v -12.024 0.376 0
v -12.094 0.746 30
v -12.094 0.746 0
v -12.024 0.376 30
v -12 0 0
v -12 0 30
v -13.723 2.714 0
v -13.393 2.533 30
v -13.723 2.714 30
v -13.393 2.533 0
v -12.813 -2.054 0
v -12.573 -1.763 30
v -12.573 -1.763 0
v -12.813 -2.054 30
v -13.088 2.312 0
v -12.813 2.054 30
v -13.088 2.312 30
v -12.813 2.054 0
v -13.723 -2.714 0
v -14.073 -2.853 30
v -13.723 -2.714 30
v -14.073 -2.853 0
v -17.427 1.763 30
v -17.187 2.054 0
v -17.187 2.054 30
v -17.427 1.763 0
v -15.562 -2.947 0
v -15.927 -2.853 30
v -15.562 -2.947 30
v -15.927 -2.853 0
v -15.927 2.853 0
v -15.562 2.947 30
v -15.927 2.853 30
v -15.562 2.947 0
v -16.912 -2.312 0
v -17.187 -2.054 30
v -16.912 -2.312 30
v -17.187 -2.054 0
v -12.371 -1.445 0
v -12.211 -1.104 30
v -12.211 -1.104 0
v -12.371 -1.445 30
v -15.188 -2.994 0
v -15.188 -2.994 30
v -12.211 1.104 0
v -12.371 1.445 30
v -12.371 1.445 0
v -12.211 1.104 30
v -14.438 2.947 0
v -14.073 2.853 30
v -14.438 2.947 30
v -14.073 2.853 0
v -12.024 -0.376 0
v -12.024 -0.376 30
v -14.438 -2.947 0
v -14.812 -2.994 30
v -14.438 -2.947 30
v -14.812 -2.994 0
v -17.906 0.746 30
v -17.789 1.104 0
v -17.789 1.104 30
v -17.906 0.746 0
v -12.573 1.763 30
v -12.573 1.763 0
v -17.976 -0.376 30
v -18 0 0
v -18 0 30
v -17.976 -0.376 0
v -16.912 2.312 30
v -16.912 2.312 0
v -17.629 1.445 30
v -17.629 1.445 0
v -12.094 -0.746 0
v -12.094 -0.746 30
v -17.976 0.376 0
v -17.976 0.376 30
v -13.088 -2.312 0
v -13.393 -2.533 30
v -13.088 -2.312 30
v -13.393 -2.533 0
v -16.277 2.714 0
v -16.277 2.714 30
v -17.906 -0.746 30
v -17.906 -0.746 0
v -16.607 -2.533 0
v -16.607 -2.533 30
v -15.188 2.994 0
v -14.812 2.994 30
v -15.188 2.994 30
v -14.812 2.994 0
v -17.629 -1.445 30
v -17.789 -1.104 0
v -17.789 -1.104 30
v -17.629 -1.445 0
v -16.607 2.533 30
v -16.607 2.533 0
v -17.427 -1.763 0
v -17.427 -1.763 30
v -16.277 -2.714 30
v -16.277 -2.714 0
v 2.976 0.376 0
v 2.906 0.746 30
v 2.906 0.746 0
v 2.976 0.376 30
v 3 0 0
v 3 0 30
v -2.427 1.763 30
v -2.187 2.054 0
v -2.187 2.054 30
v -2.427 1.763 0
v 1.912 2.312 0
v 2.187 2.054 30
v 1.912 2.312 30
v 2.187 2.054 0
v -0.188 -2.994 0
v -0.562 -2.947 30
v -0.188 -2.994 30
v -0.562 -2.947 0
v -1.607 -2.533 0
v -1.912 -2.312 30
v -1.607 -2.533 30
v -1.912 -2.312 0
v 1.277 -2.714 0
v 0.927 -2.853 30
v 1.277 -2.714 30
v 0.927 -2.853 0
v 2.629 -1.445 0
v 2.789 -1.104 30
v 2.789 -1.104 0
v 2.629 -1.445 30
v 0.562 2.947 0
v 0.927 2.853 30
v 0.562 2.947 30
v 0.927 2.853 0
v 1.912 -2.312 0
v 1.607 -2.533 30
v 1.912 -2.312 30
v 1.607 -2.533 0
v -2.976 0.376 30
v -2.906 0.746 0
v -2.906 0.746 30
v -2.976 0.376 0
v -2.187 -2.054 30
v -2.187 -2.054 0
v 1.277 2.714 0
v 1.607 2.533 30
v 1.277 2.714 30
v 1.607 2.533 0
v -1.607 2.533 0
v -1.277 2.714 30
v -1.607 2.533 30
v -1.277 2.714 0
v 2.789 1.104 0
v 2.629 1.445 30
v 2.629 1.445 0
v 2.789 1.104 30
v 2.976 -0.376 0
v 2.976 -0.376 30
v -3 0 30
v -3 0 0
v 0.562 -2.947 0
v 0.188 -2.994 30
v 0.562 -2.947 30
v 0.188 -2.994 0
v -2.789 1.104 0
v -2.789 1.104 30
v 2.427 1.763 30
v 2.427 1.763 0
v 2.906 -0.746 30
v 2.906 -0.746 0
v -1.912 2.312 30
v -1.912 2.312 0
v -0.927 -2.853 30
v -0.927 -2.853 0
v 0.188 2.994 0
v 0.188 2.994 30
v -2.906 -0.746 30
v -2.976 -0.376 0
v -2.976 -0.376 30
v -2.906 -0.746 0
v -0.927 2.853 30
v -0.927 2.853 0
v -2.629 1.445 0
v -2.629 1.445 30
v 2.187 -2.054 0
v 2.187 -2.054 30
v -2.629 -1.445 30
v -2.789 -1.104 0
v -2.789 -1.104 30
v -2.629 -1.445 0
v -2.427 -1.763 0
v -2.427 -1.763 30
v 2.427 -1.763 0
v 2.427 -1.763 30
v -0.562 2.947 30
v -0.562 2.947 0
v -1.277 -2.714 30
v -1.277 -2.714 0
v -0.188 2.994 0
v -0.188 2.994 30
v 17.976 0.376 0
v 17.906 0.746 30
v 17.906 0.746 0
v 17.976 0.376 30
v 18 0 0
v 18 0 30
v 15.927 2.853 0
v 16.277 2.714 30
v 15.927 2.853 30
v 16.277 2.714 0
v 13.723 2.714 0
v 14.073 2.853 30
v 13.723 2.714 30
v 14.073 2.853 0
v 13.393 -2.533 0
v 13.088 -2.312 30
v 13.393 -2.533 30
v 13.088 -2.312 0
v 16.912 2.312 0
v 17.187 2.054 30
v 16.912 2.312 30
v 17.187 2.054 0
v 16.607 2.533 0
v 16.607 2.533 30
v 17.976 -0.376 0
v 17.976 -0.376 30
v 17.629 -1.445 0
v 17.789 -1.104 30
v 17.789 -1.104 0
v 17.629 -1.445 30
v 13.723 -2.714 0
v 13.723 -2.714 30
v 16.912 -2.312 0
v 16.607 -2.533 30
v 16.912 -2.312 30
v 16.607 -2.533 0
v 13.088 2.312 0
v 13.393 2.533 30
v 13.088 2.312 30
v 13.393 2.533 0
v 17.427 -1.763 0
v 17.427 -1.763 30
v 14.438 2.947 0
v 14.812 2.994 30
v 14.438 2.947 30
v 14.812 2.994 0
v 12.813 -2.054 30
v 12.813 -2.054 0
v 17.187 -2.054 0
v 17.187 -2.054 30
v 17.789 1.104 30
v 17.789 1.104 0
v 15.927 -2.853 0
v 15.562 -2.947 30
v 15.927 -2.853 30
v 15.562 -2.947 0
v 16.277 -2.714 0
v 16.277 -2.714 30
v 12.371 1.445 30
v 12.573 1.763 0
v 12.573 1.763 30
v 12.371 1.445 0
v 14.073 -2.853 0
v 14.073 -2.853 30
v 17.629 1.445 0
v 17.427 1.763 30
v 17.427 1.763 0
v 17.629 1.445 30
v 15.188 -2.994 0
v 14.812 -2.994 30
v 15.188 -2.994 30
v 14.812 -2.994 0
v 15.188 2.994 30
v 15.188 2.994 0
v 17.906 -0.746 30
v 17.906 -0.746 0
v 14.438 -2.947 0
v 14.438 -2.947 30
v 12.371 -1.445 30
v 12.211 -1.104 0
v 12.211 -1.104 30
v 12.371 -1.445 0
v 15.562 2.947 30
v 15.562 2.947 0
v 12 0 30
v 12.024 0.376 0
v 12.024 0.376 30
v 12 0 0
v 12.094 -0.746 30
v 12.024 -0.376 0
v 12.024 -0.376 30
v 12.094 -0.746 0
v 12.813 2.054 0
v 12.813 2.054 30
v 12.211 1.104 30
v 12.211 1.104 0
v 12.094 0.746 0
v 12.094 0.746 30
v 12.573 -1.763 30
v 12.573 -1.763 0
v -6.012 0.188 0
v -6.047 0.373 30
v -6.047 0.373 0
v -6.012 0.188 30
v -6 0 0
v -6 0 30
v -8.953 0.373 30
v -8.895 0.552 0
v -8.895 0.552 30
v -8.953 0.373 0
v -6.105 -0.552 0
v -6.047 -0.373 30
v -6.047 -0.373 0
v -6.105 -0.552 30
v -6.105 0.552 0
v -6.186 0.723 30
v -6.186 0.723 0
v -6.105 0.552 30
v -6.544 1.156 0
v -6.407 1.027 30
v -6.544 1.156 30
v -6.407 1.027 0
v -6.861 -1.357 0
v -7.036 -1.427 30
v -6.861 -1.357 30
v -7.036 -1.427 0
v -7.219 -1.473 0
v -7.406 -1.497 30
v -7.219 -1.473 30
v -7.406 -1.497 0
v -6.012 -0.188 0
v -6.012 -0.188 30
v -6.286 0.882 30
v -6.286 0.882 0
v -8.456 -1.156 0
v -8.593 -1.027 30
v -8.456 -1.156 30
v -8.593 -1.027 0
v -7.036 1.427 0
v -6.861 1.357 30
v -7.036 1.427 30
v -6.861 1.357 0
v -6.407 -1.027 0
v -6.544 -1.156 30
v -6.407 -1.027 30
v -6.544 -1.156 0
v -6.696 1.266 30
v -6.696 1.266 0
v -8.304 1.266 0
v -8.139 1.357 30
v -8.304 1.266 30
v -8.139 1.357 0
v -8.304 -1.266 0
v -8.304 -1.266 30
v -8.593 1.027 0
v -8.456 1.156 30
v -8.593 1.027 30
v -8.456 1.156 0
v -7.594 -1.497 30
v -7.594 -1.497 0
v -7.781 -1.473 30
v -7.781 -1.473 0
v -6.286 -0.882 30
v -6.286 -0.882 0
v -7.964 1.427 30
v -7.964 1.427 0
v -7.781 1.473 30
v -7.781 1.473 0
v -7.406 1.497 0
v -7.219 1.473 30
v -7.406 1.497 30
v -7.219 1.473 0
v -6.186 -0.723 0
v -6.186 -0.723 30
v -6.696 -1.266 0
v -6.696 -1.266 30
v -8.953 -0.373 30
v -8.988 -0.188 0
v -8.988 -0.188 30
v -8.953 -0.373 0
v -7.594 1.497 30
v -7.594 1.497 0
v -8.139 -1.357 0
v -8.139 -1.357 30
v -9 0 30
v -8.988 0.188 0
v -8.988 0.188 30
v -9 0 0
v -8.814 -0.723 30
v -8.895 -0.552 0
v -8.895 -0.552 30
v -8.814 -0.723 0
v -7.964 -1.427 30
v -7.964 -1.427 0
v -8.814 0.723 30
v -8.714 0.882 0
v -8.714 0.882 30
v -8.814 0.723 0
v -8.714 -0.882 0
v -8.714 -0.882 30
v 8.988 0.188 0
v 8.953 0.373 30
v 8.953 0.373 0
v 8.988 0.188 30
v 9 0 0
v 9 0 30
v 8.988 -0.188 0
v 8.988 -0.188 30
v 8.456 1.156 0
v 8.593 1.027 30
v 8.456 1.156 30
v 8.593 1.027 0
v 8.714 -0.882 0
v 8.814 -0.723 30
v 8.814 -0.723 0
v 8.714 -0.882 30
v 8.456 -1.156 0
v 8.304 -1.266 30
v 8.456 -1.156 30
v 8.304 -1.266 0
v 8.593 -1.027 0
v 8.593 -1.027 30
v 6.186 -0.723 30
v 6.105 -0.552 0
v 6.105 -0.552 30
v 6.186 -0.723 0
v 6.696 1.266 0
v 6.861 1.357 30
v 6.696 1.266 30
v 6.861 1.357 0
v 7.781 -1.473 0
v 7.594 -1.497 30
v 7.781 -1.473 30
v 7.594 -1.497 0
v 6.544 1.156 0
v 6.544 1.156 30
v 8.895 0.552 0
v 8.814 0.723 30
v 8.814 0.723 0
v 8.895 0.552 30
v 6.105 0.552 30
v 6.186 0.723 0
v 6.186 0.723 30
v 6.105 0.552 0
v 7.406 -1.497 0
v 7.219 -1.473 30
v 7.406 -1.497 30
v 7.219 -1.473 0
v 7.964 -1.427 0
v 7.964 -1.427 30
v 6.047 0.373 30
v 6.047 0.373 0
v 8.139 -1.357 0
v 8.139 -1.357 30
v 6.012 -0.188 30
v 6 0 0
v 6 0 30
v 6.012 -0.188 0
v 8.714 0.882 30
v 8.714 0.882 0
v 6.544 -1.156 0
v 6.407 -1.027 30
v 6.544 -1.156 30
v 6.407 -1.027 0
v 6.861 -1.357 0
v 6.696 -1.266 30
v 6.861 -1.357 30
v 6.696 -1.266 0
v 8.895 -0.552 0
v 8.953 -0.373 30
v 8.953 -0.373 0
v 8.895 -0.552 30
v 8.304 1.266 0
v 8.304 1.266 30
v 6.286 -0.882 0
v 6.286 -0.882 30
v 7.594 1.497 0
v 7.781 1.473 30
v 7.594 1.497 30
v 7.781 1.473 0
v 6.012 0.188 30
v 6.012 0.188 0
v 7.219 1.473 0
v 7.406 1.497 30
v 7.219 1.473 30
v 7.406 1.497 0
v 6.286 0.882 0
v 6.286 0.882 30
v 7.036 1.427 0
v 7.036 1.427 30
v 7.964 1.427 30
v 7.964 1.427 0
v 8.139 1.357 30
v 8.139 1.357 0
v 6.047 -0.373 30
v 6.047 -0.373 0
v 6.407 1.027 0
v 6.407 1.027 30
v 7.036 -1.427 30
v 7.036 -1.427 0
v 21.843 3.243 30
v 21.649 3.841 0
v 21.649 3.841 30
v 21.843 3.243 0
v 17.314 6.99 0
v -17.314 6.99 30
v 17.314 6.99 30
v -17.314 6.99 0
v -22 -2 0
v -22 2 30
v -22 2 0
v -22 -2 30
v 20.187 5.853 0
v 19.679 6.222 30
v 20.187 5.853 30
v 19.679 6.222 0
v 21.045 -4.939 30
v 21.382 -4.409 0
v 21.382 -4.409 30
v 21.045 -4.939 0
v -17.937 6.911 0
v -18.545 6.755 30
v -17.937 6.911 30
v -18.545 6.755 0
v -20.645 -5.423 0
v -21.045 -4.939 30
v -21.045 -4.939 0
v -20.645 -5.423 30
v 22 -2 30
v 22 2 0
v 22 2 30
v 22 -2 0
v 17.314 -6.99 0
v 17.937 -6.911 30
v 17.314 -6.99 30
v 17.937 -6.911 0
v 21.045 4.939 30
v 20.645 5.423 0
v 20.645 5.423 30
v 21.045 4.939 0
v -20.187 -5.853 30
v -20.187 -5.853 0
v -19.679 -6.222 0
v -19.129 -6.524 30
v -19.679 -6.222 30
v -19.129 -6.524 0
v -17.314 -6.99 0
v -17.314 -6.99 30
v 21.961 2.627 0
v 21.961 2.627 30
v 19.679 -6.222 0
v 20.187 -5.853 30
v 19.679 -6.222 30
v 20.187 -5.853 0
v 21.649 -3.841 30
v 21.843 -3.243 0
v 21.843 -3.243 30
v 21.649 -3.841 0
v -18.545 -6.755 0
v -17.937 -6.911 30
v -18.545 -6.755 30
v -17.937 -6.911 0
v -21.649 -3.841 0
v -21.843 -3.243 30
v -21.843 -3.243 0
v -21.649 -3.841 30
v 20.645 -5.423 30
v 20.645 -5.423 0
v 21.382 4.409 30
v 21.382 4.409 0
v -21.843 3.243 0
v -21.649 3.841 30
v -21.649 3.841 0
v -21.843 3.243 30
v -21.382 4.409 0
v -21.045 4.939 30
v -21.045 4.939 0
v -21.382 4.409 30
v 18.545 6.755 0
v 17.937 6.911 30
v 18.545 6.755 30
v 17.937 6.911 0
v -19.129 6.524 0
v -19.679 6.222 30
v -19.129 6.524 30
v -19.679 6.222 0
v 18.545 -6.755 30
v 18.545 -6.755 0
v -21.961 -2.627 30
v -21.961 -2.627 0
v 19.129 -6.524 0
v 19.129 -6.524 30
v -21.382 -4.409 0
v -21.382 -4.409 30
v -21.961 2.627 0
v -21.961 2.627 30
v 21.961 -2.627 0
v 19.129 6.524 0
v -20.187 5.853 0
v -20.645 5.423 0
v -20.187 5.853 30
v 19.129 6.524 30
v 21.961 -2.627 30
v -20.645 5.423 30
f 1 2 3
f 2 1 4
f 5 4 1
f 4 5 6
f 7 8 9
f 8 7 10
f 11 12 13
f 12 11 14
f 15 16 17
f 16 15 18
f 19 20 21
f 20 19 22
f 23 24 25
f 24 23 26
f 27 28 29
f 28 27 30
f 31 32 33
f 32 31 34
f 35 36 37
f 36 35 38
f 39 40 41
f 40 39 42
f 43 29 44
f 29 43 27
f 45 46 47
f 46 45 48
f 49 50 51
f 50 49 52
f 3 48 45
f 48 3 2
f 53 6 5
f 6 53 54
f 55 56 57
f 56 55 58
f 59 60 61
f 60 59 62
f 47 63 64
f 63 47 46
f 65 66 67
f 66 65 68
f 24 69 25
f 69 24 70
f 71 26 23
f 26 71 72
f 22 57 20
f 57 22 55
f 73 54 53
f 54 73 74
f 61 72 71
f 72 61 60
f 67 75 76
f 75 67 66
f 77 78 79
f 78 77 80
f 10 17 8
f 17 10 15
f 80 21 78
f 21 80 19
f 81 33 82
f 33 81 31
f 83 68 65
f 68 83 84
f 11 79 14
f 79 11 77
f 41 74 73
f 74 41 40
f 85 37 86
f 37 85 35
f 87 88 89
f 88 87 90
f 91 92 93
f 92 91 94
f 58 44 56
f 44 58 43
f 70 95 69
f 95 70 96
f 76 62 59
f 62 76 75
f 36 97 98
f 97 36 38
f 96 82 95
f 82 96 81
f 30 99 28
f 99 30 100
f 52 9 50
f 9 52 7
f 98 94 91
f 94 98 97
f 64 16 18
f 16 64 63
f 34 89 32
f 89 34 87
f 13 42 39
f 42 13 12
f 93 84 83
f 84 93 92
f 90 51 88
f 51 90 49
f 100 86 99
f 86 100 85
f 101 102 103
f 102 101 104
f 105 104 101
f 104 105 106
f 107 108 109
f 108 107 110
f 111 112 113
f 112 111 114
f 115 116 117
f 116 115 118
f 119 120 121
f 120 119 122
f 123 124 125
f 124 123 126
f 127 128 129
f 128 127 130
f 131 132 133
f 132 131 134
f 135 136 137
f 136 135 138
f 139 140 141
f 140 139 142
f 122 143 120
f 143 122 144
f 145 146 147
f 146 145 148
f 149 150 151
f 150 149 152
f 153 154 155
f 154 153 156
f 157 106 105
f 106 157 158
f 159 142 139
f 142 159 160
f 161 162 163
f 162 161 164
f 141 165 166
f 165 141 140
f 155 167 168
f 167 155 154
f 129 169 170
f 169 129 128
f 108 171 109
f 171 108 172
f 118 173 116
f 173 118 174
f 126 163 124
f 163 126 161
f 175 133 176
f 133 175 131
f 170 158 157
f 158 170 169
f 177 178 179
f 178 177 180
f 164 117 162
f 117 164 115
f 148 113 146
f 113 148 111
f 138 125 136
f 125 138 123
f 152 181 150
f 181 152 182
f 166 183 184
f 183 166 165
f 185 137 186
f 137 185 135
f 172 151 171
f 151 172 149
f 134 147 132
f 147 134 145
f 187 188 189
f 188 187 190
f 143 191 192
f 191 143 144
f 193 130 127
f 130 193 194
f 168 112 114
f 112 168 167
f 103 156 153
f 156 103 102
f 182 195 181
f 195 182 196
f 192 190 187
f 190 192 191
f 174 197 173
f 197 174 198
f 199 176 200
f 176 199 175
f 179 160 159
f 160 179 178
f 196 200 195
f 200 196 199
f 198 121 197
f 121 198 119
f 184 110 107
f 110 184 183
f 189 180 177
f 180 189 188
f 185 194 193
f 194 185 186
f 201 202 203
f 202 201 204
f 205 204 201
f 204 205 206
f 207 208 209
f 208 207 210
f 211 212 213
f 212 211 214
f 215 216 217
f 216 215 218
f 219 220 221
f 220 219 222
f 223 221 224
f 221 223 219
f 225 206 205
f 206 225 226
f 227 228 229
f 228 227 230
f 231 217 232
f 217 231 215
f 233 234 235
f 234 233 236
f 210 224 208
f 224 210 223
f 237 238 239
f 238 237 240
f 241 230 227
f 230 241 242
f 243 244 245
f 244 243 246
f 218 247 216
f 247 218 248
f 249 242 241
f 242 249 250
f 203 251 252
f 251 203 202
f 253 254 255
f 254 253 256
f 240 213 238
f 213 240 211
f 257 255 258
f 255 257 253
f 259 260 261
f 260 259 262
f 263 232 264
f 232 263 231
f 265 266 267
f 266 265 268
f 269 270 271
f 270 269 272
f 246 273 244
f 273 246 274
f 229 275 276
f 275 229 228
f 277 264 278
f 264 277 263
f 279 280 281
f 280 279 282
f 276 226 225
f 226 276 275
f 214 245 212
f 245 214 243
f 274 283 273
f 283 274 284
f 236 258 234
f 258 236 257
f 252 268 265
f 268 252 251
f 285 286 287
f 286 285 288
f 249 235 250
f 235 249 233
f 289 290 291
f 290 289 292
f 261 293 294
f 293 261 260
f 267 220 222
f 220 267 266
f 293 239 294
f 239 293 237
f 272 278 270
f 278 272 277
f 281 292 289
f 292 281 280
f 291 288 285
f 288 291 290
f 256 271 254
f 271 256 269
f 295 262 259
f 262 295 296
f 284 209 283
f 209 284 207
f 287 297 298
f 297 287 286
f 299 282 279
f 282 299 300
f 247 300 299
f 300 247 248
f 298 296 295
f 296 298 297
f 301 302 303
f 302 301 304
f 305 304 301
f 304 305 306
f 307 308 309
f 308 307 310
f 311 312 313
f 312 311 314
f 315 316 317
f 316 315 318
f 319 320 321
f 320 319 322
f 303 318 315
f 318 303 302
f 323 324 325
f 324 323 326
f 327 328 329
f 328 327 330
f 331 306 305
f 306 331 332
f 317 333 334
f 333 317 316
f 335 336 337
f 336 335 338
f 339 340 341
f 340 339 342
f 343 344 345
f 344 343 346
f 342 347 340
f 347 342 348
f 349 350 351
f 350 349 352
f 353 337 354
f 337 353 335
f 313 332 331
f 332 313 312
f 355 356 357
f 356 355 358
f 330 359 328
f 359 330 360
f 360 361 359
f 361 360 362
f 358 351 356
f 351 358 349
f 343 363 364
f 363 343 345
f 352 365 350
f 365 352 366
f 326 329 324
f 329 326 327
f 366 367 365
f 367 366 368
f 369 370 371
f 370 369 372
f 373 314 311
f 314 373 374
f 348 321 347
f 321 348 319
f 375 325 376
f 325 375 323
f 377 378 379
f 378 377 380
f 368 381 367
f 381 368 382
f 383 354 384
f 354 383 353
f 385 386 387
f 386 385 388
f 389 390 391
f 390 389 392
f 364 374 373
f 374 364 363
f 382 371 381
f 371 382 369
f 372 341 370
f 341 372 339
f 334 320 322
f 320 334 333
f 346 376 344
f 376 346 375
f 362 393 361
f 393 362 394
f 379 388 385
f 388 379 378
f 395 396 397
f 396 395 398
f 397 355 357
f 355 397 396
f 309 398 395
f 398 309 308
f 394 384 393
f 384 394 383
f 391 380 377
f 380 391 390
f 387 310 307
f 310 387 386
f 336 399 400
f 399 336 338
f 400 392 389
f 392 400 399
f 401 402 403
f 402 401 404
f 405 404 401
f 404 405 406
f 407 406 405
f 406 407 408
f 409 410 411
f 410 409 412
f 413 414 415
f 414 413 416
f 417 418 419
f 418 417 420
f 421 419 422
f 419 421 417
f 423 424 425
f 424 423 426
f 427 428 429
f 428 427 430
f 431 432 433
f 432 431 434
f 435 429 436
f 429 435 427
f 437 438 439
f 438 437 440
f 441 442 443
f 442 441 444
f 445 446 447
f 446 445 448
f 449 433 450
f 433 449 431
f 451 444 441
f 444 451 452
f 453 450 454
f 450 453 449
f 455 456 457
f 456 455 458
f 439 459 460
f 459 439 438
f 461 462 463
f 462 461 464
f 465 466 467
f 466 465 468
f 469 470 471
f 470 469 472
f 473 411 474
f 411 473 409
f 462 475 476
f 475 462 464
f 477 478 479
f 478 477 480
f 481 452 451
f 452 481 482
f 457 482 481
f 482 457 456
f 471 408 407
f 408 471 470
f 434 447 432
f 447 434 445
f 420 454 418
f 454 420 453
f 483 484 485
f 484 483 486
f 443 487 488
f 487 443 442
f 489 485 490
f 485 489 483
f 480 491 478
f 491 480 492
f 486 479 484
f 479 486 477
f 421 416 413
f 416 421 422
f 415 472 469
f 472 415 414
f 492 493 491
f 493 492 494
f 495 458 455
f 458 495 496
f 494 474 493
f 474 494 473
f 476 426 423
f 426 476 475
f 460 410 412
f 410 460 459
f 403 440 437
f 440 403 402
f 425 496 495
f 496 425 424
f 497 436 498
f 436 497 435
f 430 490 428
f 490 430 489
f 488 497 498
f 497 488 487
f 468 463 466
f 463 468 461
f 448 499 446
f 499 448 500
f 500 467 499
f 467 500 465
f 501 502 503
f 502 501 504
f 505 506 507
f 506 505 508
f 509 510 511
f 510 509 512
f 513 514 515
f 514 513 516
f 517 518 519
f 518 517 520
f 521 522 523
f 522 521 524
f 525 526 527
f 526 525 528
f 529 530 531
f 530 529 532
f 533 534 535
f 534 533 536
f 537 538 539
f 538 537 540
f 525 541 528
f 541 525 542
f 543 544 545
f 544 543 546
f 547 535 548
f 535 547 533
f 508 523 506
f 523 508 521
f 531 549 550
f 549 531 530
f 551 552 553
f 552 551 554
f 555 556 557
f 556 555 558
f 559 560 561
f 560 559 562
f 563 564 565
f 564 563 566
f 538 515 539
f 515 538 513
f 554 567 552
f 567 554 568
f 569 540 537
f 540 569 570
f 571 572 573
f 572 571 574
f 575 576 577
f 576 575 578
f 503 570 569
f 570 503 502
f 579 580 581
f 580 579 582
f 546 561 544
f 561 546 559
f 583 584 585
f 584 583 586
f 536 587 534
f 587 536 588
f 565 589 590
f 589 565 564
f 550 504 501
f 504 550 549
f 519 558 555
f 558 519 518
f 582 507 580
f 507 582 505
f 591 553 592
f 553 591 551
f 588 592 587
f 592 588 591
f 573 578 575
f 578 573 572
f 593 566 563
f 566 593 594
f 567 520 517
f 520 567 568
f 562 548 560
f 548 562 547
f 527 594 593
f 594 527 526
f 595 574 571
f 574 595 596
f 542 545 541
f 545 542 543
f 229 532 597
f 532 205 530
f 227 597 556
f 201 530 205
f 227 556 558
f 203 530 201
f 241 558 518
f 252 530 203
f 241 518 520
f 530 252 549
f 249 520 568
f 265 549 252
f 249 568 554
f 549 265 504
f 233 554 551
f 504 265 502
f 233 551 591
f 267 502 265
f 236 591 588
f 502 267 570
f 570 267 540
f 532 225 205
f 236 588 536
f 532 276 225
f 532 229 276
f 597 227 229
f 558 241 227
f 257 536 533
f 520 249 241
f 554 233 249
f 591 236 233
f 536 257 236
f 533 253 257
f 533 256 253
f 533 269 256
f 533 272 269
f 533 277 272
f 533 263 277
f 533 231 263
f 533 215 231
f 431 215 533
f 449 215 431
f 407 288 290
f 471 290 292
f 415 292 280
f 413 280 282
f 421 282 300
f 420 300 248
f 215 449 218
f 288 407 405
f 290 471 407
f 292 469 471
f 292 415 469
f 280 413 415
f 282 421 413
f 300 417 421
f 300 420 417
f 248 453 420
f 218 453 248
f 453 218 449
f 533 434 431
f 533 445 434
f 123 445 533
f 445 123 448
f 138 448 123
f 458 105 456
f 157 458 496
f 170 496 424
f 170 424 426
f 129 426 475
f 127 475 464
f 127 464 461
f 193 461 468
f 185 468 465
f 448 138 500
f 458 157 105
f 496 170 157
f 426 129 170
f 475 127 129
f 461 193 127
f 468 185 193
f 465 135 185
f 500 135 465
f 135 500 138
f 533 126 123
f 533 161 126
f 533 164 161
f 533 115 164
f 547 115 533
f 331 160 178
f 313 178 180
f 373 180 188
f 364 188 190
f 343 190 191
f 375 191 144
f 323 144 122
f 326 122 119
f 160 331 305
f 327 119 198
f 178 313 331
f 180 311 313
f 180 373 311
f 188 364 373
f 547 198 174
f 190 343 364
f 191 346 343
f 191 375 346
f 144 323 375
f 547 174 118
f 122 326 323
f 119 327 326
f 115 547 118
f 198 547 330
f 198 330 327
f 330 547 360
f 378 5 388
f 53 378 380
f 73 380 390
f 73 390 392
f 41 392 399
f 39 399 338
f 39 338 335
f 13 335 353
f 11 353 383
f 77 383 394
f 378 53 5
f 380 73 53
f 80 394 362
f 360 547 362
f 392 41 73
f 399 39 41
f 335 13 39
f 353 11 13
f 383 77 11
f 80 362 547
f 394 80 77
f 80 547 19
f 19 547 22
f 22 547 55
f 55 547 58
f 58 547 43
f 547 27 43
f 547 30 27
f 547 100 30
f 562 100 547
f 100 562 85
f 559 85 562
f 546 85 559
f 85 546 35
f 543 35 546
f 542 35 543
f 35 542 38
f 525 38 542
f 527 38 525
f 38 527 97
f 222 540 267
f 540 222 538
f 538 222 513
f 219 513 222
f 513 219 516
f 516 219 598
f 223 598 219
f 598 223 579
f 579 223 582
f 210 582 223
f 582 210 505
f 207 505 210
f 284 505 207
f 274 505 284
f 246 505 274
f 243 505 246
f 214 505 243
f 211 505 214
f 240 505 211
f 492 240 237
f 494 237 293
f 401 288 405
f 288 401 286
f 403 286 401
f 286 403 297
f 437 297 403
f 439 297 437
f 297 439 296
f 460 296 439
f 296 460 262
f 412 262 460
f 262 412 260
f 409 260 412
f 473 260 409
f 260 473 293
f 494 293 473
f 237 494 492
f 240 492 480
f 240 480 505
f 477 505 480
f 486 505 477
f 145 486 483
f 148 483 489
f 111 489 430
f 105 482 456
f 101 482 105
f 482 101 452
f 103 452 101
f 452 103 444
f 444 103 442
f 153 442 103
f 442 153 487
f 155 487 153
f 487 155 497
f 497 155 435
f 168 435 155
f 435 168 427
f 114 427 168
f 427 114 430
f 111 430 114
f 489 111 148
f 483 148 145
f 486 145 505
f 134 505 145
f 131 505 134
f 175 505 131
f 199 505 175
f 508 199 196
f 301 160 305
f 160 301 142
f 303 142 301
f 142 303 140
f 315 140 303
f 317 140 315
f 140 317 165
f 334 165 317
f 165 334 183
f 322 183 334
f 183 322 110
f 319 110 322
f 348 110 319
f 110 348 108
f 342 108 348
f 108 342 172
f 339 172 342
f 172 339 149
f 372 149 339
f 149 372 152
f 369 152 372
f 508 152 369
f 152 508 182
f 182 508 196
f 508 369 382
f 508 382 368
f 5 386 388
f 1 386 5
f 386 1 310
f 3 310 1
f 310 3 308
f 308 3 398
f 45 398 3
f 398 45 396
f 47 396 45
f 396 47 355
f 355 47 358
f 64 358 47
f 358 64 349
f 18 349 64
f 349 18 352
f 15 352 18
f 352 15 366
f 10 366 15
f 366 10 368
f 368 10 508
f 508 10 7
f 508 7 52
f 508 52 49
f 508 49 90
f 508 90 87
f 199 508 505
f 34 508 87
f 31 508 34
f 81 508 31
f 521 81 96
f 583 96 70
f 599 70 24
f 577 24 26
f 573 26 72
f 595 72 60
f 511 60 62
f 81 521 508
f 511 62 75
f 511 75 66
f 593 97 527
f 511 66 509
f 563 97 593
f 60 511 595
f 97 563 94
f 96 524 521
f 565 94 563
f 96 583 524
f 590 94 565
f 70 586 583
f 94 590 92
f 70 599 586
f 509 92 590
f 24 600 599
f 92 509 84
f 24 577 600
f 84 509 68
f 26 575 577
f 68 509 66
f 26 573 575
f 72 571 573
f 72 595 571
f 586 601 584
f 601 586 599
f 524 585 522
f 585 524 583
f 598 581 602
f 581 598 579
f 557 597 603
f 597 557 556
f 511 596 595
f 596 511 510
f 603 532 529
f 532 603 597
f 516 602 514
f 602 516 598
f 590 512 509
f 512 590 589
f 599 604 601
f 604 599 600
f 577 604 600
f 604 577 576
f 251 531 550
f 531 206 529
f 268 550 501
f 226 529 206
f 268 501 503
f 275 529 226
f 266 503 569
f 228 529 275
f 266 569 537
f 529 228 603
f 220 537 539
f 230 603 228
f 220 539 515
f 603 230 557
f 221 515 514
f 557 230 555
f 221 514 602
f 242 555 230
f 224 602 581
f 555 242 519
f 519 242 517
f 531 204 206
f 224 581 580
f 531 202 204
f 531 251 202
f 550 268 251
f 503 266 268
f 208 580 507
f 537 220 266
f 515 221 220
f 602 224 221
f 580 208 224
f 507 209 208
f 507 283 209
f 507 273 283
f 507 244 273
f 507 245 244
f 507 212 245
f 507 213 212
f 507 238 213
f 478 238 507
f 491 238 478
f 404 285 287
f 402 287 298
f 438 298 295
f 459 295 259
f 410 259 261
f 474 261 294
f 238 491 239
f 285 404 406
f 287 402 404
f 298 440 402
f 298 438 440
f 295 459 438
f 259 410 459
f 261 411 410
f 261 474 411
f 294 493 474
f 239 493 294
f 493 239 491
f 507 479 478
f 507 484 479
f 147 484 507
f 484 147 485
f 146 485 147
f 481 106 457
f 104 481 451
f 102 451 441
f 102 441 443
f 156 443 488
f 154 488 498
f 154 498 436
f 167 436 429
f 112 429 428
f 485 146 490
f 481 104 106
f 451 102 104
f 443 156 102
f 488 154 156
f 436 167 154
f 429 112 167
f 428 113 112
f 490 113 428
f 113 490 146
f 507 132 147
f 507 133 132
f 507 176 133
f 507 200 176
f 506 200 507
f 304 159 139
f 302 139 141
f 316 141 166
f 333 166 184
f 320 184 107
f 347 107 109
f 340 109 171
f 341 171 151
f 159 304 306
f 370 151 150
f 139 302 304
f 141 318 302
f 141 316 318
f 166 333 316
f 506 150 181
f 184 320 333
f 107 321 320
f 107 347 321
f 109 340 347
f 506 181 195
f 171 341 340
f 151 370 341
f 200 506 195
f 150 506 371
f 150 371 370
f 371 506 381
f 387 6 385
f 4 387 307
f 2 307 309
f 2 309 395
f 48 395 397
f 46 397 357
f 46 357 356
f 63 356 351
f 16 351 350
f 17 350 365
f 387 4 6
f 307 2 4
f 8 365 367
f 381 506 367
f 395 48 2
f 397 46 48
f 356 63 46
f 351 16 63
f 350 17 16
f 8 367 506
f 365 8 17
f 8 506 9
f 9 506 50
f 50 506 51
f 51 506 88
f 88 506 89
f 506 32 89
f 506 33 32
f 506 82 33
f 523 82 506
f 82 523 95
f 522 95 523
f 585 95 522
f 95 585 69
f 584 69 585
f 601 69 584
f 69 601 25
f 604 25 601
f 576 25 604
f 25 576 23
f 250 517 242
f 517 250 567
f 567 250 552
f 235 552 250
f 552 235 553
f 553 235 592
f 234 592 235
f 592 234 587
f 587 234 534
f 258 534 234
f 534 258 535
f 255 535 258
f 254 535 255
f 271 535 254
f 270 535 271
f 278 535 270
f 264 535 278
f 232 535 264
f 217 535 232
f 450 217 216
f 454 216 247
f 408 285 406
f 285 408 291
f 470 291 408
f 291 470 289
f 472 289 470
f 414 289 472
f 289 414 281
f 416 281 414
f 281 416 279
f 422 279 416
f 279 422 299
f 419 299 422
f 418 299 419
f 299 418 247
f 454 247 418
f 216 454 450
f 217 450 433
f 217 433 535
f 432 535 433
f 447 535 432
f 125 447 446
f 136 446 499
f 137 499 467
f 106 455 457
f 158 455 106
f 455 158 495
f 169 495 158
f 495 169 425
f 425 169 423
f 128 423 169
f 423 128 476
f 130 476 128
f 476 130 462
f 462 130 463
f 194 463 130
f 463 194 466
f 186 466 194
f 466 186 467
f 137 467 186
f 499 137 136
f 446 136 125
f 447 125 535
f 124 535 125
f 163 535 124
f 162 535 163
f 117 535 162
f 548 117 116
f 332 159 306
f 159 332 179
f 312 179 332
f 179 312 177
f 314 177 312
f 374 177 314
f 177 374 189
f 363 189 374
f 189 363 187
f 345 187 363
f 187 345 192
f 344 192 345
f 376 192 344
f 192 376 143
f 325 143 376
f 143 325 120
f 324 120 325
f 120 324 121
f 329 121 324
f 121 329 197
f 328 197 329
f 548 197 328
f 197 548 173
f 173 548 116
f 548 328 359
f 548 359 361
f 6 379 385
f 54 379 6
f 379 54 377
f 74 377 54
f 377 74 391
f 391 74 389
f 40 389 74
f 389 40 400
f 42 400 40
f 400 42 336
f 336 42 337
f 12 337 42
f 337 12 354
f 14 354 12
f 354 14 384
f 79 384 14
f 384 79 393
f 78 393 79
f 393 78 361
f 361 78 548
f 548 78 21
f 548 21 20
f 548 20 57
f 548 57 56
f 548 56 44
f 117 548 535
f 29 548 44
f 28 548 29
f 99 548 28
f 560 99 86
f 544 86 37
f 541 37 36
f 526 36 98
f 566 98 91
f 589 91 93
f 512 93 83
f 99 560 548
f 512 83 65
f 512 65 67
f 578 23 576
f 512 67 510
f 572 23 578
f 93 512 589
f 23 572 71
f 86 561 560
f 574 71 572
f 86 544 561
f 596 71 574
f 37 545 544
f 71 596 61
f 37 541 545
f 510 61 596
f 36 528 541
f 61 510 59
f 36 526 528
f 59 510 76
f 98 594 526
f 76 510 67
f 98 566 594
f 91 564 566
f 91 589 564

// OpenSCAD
$fn = 50;


difference() {
	union() {
		*color(alpha = 1.0000000000, c = "gray") {
			translate(v = [0, 7, 0]) {
				linear_extrude(height = 1) {
					text(font = "Arial:style=Bold", halign = "center", size = 4.5000000000, text = "COMMENT plate main", valign = "center");
				}
			}
		}
		*color(alpha = 1.0000000000, c = "gray") {
			translate(v = [0, 14, 0]) {
				linear_extrude(height = 1) {
					text(font = "Arial:style=Bold", halign = "center", size = 4.5000000000, text = "COMMENT description oobb_plate_shape_p_type_30_depth_3_width_1_height_30_thickness_true_both_holes", valign = "center");
				}
			}
		}
		hull() {
			translate(v = [-17.0000000000, 2.0000000000, 0]) {
				cylinder(h = 30, r = 5);
			}
			translate(v = [17.0000000000, 2.0000000000, 0]) {
				cylinder(h = 30, r = 5);
			}
			translate(v = [-17.0000000000, -2.0000000000, 0]) {
				cylinder(h = 30, r = 5);
			}
			translate(v = [17.0000000000, -2.0000000000, 0]) {
				cylinder(h = 30, r = 5);
			}
		}
	}
	union() {
		*color(alpha = 1.0000000000, c = "gray") {
			translate(v = [0, 7, 0]) {
				linear_extrude(height = 1) {
					text(font = "Arial:style=Bold", halign = "center", size = 4.5000000000, text = "COMMENT holes main", valign = "center");
				}
			}
		}
		*color(alpha = 1.0000000000, c = "gray") {
			translate(v = [0, 14, 0]) {
				linear_extrude(height = 1) {
					text(font = "Arial:style=Bold", halign = "center", size = 4.5000000000, text = "COMMENT description oobb_holes_shape_n_type_3_width_1_height_30_thickness_true_both_holes", valign = "center");
				}
			}
		}
		translate(v = [-15.0000000000, 0.0000000000, 0]) {
			translate(v = [0, 0, -50]) {
				cylinder(h = 100, r = 3.0000000000);
			}
		}
		translate(v = [0, 0, -50]) {
			cylinder(h = 100, r = 3.0000000000);
		}
		translate(v = [15.0000000000, 0.0000000000, 0]) {
			translate(v = [0, 0, -50]) {
				cylinder(h = 100, r = 3.0000000000);
			}
		}
		translate(v = [-15.0000000000, 0.0000000000, 0]) {
			translate(v = [0, 0, -50]) {
				cylinder(h = 100, r = 1.5000000000);
			}
		}
		translate(v = [-7.5000000000, 0.0000000000, 0]) {
			translate(v = [0, 0, -50]) {
				cylinder(h = 100, r = 1.5000000000);
			}
		}
		translate(v = [0, 0, -50]) {
			cylinder(h = 100, r = 1.5000000000);
		}
		translate(v = [7.5000000000, 0.0000000000, 0]) {
			translate(v = [0, 0, -50]) {
				cylinder(h = 100, r = 1.5000000000);
			}
		}
		translate(v = [15.0000000000, 0.0000000000, 0]) {
			translate(v = [0, 0, -50]) {
				cylinder(h = 100, r = 1.5000000000);
			}
		}
	}
}
